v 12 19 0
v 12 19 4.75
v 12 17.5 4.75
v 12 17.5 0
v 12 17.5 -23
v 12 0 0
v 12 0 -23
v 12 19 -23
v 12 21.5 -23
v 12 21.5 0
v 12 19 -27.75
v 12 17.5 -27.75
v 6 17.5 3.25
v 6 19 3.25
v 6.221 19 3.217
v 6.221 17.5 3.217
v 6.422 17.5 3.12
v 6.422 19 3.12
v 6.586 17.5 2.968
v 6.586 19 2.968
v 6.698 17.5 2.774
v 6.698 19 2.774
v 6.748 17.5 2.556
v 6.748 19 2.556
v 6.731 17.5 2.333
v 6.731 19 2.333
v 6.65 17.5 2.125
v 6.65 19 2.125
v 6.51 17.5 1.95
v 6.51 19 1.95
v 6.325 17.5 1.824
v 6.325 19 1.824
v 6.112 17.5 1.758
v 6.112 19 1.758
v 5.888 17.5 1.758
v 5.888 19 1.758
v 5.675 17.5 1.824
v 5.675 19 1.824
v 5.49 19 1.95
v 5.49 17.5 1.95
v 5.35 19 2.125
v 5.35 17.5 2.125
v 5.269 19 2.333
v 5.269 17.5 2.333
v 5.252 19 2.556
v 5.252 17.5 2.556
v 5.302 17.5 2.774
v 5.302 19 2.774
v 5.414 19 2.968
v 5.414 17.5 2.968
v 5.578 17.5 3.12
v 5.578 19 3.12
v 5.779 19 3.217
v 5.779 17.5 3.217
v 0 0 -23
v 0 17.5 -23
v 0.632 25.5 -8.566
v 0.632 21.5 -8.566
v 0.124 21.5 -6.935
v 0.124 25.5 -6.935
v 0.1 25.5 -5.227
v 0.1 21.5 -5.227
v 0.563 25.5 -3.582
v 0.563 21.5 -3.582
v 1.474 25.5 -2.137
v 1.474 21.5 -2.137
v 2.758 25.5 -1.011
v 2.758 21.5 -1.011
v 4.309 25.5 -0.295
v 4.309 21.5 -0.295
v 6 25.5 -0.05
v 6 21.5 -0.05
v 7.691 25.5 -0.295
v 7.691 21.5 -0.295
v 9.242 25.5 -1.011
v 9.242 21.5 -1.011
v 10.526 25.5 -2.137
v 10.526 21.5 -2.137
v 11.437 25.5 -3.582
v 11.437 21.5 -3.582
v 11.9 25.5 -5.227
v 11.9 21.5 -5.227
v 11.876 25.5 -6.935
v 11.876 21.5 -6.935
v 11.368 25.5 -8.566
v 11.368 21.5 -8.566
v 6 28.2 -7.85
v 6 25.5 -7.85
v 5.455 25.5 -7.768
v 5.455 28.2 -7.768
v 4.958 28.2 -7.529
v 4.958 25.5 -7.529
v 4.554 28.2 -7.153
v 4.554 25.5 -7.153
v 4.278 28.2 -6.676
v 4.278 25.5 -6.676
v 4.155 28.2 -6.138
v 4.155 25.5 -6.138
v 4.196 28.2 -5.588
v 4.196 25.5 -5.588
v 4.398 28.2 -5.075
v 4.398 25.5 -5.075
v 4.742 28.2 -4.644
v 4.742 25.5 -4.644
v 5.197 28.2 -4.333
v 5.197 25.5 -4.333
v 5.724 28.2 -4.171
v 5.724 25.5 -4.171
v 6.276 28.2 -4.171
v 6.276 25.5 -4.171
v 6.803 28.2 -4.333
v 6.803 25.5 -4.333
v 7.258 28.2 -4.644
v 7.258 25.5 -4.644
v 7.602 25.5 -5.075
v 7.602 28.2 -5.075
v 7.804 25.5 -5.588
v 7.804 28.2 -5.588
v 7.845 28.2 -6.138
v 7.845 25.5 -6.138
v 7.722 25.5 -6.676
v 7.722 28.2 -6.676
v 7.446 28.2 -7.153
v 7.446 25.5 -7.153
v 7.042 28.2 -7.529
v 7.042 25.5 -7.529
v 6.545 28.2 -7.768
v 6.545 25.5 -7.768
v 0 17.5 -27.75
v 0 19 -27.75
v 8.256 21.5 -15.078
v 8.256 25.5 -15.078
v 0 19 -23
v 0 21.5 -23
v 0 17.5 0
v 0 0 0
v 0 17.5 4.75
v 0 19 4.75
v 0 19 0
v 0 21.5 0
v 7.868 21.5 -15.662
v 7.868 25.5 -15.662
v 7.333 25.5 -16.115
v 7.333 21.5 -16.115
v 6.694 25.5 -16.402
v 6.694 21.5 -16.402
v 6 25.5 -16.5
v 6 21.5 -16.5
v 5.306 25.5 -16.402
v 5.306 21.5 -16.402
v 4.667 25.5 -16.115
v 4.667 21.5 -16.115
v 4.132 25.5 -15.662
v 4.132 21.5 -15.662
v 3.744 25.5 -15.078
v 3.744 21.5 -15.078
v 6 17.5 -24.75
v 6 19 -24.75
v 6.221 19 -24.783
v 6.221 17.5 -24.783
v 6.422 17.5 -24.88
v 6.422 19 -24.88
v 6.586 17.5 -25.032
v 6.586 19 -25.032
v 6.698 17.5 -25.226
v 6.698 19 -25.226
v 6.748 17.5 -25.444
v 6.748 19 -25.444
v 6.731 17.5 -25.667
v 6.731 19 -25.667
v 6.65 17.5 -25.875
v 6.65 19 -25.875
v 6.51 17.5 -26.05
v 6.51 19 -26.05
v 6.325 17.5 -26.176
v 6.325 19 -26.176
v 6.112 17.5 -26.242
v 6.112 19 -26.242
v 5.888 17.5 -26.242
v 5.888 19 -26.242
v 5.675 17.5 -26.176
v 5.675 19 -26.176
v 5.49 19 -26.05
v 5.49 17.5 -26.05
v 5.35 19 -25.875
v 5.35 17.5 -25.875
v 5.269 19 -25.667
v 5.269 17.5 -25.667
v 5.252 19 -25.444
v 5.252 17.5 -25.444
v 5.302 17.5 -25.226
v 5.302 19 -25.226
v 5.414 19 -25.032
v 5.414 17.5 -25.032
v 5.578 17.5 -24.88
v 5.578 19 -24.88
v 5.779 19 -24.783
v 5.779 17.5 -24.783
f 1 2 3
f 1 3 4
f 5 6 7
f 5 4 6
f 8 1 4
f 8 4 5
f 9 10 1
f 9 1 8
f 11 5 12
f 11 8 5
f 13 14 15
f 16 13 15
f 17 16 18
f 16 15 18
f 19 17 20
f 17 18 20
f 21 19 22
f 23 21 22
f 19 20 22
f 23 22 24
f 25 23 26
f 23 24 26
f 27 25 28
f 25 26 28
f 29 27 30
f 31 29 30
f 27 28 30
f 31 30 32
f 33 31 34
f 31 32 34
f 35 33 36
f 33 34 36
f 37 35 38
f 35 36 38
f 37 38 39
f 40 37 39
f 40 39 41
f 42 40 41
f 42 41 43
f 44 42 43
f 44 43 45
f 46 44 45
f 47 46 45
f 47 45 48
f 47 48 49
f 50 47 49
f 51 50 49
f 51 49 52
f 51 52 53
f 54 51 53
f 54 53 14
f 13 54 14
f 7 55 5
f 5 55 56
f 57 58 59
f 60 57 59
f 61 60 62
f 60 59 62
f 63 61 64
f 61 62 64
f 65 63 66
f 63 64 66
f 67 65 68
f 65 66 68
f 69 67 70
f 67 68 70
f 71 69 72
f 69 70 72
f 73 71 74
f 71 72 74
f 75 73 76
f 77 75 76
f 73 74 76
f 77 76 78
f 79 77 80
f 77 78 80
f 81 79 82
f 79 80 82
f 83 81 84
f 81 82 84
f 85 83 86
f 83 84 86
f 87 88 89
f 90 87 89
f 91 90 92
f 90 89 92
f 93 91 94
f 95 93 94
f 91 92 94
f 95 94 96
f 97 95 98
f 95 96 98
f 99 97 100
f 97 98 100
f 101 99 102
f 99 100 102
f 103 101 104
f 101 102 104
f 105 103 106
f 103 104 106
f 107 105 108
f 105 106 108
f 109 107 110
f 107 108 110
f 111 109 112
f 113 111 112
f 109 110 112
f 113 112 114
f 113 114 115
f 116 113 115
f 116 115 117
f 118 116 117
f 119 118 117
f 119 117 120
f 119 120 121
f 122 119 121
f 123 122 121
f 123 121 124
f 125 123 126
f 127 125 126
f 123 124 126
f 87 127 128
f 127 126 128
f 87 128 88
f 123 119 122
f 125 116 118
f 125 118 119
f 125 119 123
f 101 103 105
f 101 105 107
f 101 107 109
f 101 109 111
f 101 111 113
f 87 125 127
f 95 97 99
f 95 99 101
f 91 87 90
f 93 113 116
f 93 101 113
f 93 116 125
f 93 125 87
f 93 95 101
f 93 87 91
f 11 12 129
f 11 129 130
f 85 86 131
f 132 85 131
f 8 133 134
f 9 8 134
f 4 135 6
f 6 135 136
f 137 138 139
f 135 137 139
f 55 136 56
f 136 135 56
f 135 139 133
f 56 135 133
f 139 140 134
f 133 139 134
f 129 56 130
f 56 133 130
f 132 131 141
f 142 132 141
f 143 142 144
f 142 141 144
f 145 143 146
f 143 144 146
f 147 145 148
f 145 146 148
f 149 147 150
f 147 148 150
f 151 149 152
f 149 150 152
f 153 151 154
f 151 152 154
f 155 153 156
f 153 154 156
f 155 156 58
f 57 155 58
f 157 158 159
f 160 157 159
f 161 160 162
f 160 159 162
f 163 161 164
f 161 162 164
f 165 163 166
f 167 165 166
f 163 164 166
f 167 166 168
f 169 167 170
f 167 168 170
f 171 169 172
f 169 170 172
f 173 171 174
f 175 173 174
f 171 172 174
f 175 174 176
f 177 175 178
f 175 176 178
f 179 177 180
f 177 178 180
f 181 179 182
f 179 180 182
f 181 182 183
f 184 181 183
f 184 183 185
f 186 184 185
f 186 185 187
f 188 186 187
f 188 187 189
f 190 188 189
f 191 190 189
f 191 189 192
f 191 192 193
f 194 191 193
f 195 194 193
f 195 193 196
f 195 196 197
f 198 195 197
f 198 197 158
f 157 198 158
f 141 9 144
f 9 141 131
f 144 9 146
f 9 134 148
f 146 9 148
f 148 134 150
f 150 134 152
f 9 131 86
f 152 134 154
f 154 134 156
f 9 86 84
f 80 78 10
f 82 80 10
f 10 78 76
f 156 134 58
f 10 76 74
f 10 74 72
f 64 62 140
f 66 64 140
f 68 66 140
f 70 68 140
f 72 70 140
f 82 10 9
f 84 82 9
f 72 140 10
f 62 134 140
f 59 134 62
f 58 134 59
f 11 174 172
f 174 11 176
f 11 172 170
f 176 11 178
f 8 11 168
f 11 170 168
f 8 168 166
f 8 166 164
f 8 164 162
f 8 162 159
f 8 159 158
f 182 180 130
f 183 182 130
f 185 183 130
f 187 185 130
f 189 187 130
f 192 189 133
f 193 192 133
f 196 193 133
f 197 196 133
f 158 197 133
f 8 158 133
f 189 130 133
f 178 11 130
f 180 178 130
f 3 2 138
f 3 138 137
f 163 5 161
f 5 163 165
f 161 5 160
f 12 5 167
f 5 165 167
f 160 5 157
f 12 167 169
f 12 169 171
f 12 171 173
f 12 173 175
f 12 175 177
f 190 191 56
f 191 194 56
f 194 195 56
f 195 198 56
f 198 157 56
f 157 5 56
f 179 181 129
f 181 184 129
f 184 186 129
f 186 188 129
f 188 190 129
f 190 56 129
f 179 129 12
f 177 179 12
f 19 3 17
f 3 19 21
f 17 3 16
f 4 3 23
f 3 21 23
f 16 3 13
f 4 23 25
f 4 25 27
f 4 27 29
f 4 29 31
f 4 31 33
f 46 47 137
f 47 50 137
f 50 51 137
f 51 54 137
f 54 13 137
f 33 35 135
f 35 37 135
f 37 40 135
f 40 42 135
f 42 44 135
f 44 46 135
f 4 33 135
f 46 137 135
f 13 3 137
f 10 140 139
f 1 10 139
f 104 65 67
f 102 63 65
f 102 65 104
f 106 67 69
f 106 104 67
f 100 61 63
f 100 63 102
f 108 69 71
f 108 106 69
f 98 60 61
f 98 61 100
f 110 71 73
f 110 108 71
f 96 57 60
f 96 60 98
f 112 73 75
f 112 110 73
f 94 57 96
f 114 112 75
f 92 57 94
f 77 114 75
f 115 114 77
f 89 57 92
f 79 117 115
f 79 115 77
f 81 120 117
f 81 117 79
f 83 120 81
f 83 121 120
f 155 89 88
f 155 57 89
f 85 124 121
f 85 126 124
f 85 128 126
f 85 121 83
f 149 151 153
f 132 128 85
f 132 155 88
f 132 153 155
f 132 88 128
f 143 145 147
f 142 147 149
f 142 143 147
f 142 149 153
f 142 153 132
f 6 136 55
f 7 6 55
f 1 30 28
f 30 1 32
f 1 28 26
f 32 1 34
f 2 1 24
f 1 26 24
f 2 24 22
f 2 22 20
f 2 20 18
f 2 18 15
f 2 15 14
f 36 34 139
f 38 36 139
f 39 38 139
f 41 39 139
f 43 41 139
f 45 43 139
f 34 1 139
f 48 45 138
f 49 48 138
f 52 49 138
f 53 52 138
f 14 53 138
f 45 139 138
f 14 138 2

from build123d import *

# Parameters (mm, degrees)
AUFSATZ_LINEAR_AUSTRAGEN1_DEPTH = 12
AUFSATZ_LINEAR_AUSTRAGEN2_DEPTH = 4
SKIZZE3_R                       = 1.85
AUFSATZ_LINEAR_AUSTRAGEN3_DEPTH = 2.7
SKIZZE4_R                       = 0.75
SCHNITT_LINEAR_AUSTRAGEN1_DEPTH = 36.708017307


with BuildPart() as part:
    # Skizze1 → Aufsatz-Linear austragen1 (new body)
    with BuildSketch(Plane(origin=(0, 0, 0), x_dir=(0, 0, -1), z_dir=(1, 0, 0))):
        Polygon((0, 0), (23, 0), (23, 17.5), (27.75, 17.5), (27.75, 19), (23, 19), (23, 21.5), (0, 21.5), (0, 19), (-4.75, 19), (-4.75, 17.5), (0, 17.5), align=None)
    extrude(amount=AUFSATZ_LINEAR_AUSTRAGEN1_DEPTH)

    # Skizze2 → Aufsatz-Linear austragen2 (add)
    with BuildSketch(Plane(origin=(0, 21.5, 0), x_dir=(1, 0, 0), z_dir=(0, 1, 0))):
        with BuildLine():
            Line((3.744418815, 15.078125), (0.631716779, 8.5659375))
            ThreePointArc((0.631716779, 8.5659375), (6, 0.05), (11.368283221, 8.5659375))
            Line((11.368283221, 8.5659375), (8.255581185, 15.078125))
            ThreePointArc((8.255581185, 15.078125), (6, 16.5), (3.744418815, 15.078125))
        make_face()
    extrude(amount=AUFSATZ_LINEAR_AUSTRAGEN2_DEPTH)

    # Skizze3 → Aufsatz-Linear austragen3 (add)
    with BuildSketch(Plane(origin=(0, 25.5, 0), x_dir=(1, 0, 0), z_dir=(0, 1, 0))):
        with Locations(Location((6, 6, 0), (0, 0, 90))):
            Circle(SKIZZE3_R)
    extrude(amount=AUFSATZ_LINEAR_AUSTRAGEN3_DEPTH)

    # Skizze4 → Schnitt-Linear austragen1 (cut, through all)
    with BuildSketch(Plane(origin=(0, 19, 0), x_dir=(1, 0, 0), z_dir=(0, 1, 0))):
        with Locations(Location((6, -2.5, 0), (0, 0, 270))):
            Circle(SKIZZE4_R)
        with Locations(Location((6, 25.5, 0), (0, 0, 270))):
            Circle(SKIZZE4_R)
    extrude(amount=-SCHNITT_LINEAR_AUSTRAGEN1_DEPTH, mode=Mode.SUBTRACT)


solid = part.part
